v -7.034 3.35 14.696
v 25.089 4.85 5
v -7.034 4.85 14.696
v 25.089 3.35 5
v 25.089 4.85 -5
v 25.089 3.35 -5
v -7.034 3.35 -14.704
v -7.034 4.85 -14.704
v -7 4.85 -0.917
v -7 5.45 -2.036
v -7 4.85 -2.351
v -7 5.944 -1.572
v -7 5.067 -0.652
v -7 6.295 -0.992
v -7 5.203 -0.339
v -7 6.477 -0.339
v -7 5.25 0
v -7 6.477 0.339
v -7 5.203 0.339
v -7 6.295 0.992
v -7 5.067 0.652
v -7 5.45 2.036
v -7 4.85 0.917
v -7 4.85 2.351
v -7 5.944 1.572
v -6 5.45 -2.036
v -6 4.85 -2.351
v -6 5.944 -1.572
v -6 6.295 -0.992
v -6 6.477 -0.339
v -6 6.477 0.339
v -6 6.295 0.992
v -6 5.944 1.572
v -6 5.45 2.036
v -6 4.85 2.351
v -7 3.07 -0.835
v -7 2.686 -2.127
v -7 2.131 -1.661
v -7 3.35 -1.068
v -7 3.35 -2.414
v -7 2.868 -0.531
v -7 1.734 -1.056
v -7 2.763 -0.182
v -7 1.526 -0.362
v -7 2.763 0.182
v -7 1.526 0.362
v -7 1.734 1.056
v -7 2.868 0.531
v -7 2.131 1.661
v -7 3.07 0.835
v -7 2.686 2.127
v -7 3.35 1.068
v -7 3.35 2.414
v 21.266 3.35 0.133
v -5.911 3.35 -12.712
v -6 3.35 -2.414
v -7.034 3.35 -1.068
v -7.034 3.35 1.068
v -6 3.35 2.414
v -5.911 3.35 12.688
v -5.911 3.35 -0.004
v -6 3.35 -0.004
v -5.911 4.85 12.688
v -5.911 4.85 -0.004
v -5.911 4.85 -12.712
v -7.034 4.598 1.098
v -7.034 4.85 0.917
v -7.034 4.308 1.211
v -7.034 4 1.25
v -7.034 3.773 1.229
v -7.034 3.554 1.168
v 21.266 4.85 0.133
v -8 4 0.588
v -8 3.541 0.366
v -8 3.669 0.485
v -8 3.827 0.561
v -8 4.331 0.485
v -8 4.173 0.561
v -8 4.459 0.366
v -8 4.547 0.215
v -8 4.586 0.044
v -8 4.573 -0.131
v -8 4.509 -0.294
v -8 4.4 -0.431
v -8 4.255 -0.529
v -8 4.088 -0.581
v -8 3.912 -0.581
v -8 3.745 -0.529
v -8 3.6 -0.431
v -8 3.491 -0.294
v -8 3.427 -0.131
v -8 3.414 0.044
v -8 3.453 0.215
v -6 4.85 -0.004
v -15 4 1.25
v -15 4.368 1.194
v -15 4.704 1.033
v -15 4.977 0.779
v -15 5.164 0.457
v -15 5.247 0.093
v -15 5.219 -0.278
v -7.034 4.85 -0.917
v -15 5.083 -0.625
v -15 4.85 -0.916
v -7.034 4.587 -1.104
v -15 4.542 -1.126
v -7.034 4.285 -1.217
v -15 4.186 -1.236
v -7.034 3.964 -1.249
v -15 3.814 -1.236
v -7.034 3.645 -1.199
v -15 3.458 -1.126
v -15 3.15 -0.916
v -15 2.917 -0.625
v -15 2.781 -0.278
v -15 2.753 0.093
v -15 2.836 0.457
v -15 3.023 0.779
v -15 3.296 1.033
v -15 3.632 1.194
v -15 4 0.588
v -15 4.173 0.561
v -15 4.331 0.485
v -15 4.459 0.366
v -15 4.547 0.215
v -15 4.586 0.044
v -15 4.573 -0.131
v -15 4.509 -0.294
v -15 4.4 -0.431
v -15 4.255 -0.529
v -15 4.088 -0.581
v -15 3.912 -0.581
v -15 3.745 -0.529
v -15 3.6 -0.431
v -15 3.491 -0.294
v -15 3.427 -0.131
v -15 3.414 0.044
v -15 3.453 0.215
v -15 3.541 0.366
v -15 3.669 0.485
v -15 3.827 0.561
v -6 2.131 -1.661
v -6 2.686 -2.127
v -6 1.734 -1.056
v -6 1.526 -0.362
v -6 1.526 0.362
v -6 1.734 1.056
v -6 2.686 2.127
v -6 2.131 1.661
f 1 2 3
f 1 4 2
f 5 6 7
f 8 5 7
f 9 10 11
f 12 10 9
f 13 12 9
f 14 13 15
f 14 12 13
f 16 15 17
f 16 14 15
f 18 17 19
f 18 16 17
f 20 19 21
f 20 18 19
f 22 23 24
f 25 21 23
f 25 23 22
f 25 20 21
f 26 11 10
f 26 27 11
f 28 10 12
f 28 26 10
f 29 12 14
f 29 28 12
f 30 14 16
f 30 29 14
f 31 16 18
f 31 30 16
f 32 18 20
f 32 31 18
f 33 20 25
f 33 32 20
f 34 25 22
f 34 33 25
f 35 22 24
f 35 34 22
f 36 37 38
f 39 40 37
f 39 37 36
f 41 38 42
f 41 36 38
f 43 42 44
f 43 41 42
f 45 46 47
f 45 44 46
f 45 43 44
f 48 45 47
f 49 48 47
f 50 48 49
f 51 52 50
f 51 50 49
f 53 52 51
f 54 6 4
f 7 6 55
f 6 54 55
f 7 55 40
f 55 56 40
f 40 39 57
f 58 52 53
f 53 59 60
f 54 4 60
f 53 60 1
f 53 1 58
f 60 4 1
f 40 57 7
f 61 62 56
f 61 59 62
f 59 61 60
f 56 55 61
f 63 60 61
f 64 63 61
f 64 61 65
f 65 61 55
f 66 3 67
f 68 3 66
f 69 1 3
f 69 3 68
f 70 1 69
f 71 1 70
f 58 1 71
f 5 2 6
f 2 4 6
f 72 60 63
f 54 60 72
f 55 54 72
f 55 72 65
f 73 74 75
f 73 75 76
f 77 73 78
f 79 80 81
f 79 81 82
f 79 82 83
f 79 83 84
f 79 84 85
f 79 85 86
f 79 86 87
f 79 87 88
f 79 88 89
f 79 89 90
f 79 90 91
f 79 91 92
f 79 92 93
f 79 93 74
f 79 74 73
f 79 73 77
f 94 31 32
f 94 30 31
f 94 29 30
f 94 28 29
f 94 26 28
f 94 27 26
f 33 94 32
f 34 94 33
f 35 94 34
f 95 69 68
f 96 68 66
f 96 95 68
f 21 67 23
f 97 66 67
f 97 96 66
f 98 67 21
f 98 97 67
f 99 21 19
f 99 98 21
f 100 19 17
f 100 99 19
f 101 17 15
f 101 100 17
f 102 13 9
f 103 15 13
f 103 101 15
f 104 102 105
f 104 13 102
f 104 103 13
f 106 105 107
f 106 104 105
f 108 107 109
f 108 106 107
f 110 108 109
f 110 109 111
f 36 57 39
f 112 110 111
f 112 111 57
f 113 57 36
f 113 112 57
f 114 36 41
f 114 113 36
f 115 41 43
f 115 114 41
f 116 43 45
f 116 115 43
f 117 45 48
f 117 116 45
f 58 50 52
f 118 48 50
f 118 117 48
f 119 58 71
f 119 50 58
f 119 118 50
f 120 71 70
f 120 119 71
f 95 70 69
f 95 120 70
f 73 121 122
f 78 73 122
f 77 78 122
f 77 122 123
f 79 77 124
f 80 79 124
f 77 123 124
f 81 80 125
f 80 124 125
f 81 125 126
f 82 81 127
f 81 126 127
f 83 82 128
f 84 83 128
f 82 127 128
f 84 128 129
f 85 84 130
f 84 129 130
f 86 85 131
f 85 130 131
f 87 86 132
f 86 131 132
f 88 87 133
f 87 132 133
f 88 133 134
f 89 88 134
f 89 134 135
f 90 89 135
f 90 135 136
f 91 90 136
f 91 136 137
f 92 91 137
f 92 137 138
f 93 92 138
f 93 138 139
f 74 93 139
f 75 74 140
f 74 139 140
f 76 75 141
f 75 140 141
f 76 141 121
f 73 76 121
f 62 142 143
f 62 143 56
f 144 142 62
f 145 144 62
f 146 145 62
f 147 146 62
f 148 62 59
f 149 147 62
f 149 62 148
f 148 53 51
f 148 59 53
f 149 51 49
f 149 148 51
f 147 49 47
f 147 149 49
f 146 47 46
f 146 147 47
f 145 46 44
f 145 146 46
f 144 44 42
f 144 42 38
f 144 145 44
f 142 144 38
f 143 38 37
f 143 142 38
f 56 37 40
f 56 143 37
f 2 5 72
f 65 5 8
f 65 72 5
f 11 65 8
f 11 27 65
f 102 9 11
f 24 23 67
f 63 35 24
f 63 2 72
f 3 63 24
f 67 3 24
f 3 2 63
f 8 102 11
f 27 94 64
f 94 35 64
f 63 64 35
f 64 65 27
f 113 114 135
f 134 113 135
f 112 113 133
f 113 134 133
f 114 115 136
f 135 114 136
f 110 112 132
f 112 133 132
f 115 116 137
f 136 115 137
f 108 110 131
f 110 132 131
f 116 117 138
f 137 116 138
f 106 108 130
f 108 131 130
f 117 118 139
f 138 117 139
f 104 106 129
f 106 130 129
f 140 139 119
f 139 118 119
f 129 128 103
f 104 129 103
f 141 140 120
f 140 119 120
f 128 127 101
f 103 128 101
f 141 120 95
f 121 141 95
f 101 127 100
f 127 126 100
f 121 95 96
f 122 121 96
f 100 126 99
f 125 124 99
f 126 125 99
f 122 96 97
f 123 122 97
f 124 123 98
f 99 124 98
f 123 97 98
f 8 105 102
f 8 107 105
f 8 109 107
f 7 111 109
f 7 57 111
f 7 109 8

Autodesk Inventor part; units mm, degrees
ref_plane "YZ Plane" through (0, 0, 0) normal (1, 0, 0) x (0, 1, 0)
ref_plane "XY Plane" through (0, 0, 0) normal (0, 0, 1) x (1, 0, 0)
sketch "Sketch1" plane through (0, 0, 0) normal (0, 1, 0) x (-1, 0, 0)
  arc A0 (0, -5) -> (0, 5) centre (0, 0) ccw
  line L0 (0, 5) -> (0, -5)
  dimension "d0" = 10
extrude "Extrusion1" add sketch "Sketch1" along normal blind 10
sketch "Sketch2" plane through (0, 0, 0) normal (1, 0, 0) x (0, 1, 0)
  line L0 (8.0172, -4.5) -> (8.0172, 4.5)
  line L1 (8.0172, 4.5) -> (2.5172, 4.5)
  line L2 (2.5172, -4.5) -> (0.0172, -2)
  line L3 (2.5172, 4.5) -> (0.0172, 2)
  line L4 (0.0172, -2) -> (0.0172, 2)
  line L5 (8.0172, -4.5) -> (2.5172, -4.5)
  point P0 (0, 0)
  dimension "d3" = 9
  dimension "d4" = 8
sketch "Sketch3" plane through (0, 0, 0) normal (1, 0, 0) x (0, 1, 0)
  line L0 (0, 2) -> (3, 5)
  arc A0 (3, 5) -> (0, 2) centre (1, 4) ccw
  line L1 (0, -2) -> (4, -6)
  arc A1 (0, -2) -> (4, -6) centre (1.75, -4.25) ccw
  line L2 (8.0325, 5) -> (11, 5)
  line L3 (11, 5) -> (11, -6)
  line L4 (11, -6) -> (8.0325, -6)
  line L5 (8.0325, -6) -> (8.0325, 5)
  line L6 (2.4911, 4.4911) -> (5, 7)
  line L7 (2.4911, 4.4911) -> (8.0325, 4.4911)
  arc A2 (8.0325, 4.4911) -> (5, 7) centre (7, 6.3303) ccw
  line L8 (2.4911, -4.4911) -> (8.5706, -4.4911)
  arc A3 (2.4911, -4.4911) -> (8.5706, -4.4911) centre (5.5309, -7.5041) ccw
  point P0 (0, 0)
extrude "Extrusion2" cut sketch "Sketch3" against normal through all
sketch "Sketch4" plane through (0, 0, 0) normal (0, 1, 0) x (-1, 0, 0)
  arc A0 (1.0726, -4.4911) -> (1.0726, 4.4911) centre (-1.125, 0) ccw
  arc A1 (1.0726, 4.4911) -> (1.0726, -4.4911) centre (-0.4517, 0) ccw
  point P0 (0, 0)
  point P1 (2.1976, -4.4911)
  point P2 (2.1976, 4.4911)
  dimension "d9" = 1.125
  dimension "d10" = 1.125
extrude "Extrusion3" cut sketch "Sketch4" along normal through all both and the other way through all
sketch "Sketch5" plane through (0, 0, 0) normal (1, 0, 0) x (0, 1, 0)
  line L0 (1.6, -1.2445) -> (1.6, 1.1555)
  line L1 (6.4325, 2.6911) -> (3.1125, 2.6911)
  line L2 (6.4325, -2.6911) -> (6.4325, 2.6911)
  line L3 (6.4325, -2.6911) -> (3.1125, -2.6911)
  line L4 (0, 2) -> (0, -2) projected
  line L5 (8.0325, 4.4911) -> (8.0325, -4.4911) projected
  line L6 (0, 2) -> (2.4911, 4.4911) projected
  line L7 (2.4911, 4.4911) -> (8.0325, 4.4911) projected
  line L8 (8.0325, 4.4911) -> (8.0325, -4.4911) projected
  line L9 (8.0325, -4.4911) -> (2.4911, -4.4911) projected
  line L10 (2.4911, -4.4911) -> (0, -2) projected
  line L11 (0, 2) -> (0, -2) projected
  line L12 (1.6, 1.1555) -> (3.1125, 2.6911)
  line L13 (1.6, -1.2445) -> (3.1125, -2.6911)
  line L14 (1.6, 4.6579) -> (1.6, -5.3823)
  arc A0 (1.6, 4.6579) -> (1.6, -5.3823) centre (3.2437, -0.3622) ccw
  line L15 (1.6, 1.1555) -> (5.4757, 5.0906)
  line L16 (1.6, 1.1555) -> (1.6, 7.5999)
  arc A1 (5.4757, 5.0906) -> (1.6, 7.5999) centre (3.8837, 6.8794) ccw
  line L17 (3.1125, 2.6911) -> (12.4034, 2.6911)
  line L18 (3.1125, 2.6911) -> (8.5318, 8.1936)
  arc A2 (12.4034, 2.6911) -> (8.5318, 8.1936) centre (8.3272, 3.9364) ccw
  line L19 (6.4325, 2.6911) -> (13.6333, 2.6911)
  line L20 (6.4325, 2.6911) -> (6.4325, -9.3636)
  arc A3 (6.4325, -9.3636) -> (13.6333, 2.6911) centre (6.37, -1.1482) ccw
  line L21 (6.4325, -2.6911) -> (6.4325, -11.5775)
  line L22 (6.4325, -2.6911) -> (3.1125, -2.6911)
  line L23 (3.1125, -2.6911) -> (3.2437, -12.8567)
  arc A4 (3.2437, -12.8567) -> (6.4325, -9.3636) centre (5.6123, -11.8169) ccw
  line L24 (1.6, -1.2445) -> (1.6, -8.2222)
  line L25 (1.6, -1.2445) -> (3.1125, -2.6911)
  line L26 (3.1125, -2.6911) -> (3.1946, -9.0574)
  arc A5 (1.6, -8.2222) -> (3.1946, -9.0574) centre (2.6381, -8.1801) ccw
  point P0 (0, 0)
  dimension "d16" = 1.6
  dimension "d18" = 1.6
  dimension "d21" = 1.8
  dimension "d23" = 1.8
  dimension "d24" = 2.4
  dimension "d26" = 3.32
  dimension "d27" = 3.32
extrude "Extrusion4" cut sketch "Sketch5" against normal through all contours L14 L10 L4 L6 L0 | L13 L23 L9 L10 L14 | L14 L6 L7 L15 L12 | L3 L20 L9 L23 | L14 A0 L6 L4 L10 | L10 L9 L23 A5 L24 L14 | L15 L7 L5 L17 L1 | L14 L16 A1 L15 L7 L6 | L2 L17 L5 L9 L20 | L9 L20 A4 L23 | L15 L18 A2 L17 L5 L7 | L9 L5 L17 L19 A3 L20
sketch "Sketch6" plane through (0, 0, 0) normal (1, 0, 0) x (0, 1, 0)
  circle A0 centre (4, 0) radius 2.5
  line L0 (1.6, -1.2445) -> (1.6, 1.1555) projected
  point P0 (0, 0)
  dimension "d31" = 5
  dimension "d32" = 2.4
extrude "Extrusion5" add sketch "Sketch6" against normal blind 15
sketch "Sketch7" plane through (0, 0, 0) normal (0, 1, 0) x (-1, 0, 0)
  arc A0 (3.089, -2.6911) -> (3.7176, -1.2445) centre (-1.125, 0) ccw
  arc A1 (3.7397, 1.1555) -> (3.089, 2.6911) centre (-1.125, 0) ccw projected
  arc A2 (3.7176, -1.2445) -> (3.7397, 1.1555) centre (-1.125, 0) ccw
  arc A3 (3.089, 2.6911) -> (3.089, -2.6911) centre (1.3425, 0) ccw
  point P0 (0, 0)
extrude "Extrusion6" cut sketch "Sketch7" along normal through all
sketch "Sketch8" plane through (-15, 4, 0) normal (-1, 0, 0) x (0, 0, 1)
  circle A0 centre (0, 0) radius 0.5875
  point P0 (0, -4)
  dimension "d37" = 1.175
extrude "Extrusion7" cut sketch "Sketch8" against normal blind 7
sketch "Sketch9" plane through (0, 0, 0) normal (0, 1, 0) x (-1, 0, 0)
  line L0 (6, 3) -> (2, 3)
  line L1 (2, 3) -> (2, -3)
  line L2 (2, -3) -> (6, -3)
  line L3 (6, -3) -> (6, 3)
  point P0 (0, 0)
extrude "Extrusion8" cut sketch "Sketch9" along normal through all both and the other way through all
sketch "Sketch10" plane through (-15, 4, 0) normal (-1, 0, 0) x (0, 0, 1)
  circle A0 centre (0, 0) radius 1.25
  circle A1 centre (0, 0) radius 3.9528
  point P0 (0, -4)
  dimension "d69" = 2.5
extrude "Extrusion9" cut sketch "Sketch10" against normal blind 8
ref_plane "Work Plane1" through (0, 4.1, 0) normal (0, 1, 0) x (-1, 0, 0)
sketch "Sketch12" plane through (0, 4.1, 0) normal (0, 1, 0) x (-1, 0, 0)
  line L0 (15, -1) -> (15, 1)
  line L1 (5.9113, 12.6879) -> (5.9113, -12.7121)
  line L2 (5.9113, 12.6879) -> (-21.266, 0.1332)
  line L3 (-21.266, 0.1332) -> (5.9113, -12.7121)
  line L4 (7.0341, 14.6962) -> (7.0341, -14.7038)
  line L5 (2.03, -0.0038) -> (19.03, -0.0038)
  line L6 (-25.0887, 5) -> (-25.0887, -5)
  line L7 (-25.0887, 5) -> (7.0341, 14.6962)
  line L8 (-25.0887, -5) -> (7.0341, -14.7038)
  point P0 (0, 0)
  point P1 (0, 0)
  dimension "d61" = 25.4
  dimension "d62" = 29.4
  dimension "d63" = 14.7
  dimension "d64" = 10
  dimension "d67" = 31
extrude "Extrusion11" add sketch "Sketch12" along normal mid plane 1.5
properties part number "piezo_mounted_whisk_deflector_SHORT"
